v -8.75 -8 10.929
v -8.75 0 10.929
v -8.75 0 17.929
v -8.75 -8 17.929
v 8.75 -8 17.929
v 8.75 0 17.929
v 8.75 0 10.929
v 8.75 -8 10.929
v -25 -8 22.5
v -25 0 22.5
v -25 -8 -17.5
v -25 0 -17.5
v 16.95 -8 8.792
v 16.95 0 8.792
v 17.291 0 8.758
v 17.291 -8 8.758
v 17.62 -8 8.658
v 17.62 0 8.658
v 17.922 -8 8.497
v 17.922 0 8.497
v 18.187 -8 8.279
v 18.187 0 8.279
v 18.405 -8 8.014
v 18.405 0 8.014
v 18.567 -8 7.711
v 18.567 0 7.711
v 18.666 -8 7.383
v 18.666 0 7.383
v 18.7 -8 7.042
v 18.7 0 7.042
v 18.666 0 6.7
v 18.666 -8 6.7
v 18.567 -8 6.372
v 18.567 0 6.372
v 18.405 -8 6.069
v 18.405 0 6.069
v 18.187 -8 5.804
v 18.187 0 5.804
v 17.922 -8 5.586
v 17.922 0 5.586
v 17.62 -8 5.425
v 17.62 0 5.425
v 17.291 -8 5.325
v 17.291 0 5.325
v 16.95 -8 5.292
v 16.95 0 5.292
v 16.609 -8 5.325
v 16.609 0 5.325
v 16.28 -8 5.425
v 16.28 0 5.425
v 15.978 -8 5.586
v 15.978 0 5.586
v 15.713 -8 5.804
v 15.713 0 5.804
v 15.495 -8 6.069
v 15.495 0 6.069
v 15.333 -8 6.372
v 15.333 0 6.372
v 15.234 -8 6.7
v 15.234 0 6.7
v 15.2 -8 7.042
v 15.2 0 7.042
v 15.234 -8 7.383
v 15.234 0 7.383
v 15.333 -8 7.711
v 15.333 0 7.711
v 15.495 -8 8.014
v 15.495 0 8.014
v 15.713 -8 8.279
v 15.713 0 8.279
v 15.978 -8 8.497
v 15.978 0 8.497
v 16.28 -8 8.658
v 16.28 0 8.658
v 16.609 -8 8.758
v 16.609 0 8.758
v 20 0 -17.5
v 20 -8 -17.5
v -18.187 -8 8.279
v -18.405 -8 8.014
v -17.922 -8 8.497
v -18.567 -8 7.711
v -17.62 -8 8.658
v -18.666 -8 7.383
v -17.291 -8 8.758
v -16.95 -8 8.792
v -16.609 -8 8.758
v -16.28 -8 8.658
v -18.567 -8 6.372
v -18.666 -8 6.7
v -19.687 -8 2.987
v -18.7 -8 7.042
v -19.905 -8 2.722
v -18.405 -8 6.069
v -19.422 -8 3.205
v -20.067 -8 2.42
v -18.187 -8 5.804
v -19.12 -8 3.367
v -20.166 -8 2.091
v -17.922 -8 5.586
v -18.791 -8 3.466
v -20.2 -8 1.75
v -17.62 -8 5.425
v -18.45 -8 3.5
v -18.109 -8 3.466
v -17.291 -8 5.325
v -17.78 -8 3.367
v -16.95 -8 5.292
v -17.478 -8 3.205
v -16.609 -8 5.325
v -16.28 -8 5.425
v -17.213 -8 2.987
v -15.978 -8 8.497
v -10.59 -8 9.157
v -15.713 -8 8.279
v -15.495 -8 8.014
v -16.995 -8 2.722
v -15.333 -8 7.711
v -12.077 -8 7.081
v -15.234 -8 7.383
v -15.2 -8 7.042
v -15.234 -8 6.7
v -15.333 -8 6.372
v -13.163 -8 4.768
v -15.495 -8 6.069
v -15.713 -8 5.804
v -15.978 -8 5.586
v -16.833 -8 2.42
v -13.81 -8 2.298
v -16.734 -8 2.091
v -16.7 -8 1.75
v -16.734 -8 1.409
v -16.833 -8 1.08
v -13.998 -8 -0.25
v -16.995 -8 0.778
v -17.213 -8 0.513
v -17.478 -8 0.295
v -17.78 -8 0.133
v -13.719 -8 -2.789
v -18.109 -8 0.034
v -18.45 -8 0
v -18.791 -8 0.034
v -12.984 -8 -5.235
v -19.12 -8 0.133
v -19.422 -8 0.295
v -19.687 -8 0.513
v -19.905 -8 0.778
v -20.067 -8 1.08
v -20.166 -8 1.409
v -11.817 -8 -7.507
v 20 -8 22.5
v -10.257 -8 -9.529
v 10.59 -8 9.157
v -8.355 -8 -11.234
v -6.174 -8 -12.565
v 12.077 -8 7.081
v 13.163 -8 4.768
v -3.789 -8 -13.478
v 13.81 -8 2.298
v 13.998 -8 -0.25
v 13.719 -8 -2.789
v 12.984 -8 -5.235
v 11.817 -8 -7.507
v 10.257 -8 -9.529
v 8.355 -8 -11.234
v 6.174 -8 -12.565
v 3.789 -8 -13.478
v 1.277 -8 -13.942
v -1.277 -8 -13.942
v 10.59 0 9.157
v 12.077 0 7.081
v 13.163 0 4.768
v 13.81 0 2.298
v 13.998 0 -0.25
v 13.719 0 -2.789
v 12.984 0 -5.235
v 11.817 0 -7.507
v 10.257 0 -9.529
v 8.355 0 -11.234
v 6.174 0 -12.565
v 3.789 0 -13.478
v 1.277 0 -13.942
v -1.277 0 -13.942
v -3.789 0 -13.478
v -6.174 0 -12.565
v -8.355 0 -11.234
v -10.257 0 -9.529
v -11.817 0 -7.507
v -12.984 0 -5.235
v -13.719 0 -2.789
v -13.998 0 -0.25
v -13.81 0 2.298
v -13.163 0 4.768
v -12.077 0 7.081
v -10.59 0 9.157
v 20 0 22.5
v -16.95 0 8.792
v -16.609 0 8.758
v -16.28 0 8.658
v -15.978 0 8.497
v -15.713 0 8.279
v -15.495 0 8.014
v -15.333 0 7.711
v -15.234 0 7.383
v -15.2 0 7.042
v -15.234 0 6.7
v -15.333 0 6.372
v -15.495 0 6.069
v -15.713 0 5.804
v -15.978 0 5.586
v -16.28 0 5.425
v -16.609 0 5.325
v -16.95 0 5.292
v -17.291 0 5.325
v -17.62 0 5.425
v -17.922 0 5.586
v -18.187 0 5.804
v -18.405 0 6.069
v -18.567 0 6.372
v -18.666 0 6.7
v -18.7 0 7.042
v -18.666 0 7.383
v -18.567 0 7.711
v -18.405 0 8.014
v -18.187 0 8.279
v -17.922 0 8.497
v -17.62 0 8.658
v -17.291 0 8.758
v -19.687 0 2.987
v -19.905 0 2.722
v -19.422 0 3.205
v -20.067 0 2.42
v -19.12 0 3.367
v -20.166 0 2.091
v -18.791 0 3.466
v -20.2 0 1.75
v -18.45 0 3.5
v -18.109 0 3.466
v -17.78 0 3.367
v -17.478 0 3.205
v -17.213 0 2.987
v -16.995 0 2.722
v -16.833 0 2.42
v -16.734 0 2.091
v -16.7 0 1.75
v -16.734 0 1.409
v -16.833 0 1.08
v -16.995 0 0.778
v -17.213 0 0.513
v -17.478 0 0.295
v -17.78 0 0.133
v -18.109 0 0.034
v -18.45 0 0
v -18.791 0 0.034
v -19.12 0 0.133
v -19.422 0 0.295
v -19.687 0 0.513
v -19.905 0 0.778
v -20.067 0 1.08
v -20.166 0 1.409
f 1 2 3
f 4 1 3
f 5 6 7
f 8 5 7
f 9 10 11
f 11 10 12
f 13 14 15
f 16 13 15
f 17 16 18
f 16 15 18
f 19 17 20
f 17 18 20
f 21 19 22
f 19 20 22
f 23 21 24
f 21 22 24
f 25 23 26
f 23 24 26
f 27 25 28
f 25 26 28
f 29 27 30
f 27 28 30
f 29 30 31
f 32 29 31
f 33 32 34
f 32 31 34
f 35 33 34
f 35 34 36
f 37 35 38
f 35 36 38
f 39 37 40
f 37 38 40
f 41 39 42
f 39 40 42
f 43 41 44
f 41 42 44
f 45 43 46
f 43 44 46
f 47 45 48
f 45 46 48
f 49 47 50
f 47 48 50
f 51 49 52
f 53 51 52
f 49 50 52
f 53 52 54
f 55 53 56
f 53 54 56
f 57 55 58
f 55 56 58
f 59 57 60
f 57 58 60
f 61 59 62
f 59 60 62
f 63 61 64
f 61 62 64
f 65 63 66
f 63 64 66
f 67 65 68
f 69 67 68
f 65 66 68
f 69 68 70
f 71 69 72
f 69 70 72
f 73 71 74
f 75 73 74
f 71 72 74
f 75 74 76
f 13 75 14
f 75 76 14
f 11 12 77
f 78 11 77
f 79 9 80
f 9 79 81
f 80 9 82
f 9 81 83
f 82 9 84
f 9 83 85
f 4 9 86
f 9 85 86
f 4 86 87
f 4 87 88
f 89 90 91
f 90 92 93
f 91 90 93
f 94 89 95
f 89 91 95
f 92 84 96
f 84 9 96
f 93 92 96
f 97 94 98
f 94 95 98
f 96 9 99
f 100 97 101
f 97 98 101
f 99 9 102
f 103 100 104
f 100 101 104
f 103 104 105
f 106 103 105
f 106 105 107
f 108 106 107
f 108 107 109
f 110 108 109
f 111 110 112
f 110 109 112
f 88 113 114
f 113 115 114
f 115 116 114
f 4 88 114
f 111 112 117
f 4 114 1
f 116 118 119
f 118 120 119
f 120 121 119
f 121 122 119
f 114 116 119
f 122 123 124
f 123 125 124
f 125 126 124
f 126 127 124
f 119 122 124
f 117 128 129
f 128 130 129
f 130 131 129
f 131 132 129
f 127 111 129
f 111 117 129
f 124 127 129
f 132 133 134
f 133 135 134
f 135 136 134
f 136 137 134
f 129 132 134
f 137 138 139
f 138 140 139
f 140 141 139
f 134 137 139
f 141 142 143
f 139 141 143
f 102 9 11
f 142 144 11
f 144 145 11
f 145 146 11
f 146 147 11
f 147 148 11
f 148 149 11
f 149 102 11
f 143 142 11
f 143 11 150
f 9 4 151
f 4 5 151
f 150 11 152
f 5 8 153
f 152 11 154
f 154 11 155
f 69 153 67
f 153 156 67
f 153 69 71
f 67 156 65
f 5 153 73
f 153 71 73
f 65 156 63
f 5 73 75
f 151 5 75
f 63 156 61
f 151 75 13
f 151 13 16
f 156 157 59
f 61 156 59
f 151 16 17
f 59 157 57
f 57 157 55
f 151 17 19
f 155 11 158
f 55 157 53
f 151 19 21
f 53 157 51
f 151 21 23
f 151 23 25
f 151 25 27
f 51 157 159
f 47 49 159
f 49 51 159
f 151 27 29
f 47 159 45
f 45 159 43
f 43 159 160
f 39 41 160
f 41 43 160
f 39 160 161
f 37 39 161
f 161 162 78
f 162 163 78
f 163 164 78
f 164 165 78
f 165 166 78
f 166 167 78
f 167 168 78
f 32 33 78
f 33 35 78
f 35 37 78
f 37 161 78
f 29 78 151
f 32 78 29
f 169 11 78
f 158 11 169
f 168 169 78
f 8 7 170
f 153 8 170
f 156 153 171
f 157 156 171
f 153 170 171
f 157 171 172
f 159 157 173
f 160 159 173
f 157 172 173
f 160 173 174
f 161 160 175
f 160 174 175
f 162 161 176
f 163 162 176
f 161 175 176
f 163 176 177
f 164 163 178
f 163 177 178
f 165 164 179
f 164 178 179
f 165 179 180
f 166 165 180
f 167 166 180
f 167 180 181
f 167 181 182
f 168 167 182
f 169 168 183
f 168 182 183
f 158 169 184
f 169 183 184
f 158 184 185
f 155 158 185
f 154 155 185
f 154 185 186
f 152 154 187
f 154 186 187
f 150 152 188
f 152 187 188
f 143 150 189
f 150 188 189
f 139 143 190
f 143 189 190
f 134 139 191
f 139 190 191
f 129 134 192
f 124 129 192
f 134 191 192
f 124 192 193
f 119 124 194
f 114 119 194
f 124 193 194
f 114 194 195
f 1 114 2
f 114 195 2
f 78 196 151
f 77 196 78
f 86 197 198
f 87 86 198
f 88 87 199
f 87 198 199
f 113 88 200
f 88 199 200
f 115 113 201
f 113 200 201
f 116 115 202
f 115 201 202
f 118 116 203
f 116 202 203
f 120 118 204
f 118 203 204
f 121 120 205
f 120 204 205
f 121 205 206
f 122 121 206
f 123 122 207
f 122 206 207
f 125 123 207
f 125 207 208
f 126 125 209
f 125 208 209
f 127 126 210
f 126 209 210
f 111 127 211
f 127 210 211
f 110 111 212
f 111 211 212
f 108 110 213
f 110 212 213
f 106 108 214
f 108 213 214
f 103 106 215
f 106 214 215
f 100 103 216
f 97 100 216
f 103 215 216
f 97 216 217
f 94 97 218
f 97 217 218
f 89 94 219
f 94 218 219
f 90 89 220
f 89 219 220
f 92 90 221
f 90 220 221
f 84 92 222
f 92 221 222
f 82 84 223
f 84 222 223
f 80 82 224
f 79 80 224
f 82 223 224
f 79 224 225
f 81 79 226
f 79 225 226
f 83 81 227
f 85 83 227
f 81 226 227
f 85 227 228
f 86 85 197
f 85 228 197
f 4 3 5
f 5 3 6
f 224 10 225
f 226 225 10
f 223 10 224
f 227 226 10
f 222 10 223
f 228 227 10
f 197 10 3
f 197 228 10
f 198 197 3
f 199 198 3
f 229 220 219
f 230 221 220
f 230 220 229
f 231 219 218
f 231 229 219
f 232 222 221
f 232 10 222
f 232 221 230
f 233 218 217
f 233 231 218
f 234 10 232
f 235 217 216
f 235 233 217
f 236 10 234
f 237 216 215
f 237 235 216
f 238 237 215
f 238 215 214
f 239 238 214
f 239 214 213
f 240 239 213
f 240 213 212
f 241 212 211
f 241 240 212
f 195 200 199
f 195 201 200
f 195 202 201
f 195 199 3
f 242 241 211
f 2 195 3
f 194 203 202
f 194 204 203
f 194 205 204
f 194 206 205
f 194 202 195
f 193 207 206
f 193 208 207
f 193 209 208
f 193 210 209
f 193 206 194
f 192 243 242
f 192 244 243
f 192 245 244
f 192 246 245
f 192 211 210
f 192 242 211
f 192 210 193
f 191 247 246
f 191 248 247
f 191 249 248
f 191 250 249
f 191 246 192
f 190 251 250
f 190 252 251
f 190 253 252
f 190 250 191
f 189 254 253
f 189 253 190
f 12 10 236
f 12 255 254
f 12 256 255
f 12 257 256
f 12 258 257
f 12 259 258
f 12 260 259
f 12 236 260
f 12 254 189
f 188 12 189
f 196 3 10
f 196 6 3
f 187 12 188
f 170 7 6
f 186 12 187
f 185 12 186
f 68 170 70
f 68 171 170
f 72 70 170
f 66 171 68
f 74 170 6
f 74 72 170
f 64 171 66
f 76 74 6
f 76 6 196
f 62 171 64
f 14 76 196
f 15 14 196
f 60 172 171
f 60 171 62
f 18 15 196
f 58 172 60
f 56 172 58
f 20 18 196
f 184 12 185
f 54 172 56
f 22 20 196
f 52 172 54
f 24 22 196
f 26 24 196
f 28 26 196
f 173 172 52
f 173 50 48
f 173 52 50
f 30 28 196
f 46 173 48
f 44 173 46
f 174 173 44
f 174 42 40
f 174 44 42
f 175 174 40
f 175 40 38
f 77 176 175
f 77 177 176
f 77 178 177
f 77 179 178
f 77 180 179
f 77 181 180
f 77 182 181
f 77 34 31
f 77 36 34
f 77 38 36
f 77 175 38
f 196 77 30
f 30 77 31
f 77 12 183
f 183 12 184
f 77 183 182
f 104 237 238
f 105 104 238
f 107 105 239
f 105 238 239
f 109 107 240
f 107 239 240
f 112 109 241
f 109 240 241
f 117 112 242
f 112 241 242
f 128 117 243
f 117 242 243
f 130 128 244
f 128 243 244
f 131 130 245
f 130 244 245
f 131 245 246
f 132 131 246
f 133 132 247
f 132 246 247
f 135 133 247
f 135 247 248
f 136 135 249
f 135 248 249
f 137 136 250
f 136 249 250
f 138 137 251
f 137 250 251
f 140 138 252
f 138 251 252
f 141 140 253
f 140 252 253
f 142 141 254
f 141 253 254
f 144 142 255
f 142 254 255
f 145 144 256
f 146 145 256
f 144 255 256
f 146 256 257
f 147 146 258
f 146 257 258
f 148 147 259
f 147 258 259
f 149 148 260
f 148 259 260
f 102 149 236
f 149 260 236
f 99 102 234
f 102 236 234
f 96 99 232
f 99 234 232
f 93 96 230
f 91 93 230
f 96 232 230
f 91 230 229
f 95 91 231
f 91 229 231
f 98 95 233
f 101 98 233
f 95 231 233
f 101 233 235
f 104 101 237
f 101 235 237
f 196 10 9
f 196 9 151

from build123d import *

# Parameters (mm, degrees)
SKETCH2_W                          = 45
SKETCH2_H                          = 40
STEPPER_SLIDER_BOSS_EXTRUDE1_DEPTH = 8
SKETCH1_R                          = 1.75
STEPPER_HOLE_CUT_EXTRUDE1_DEPTH    = 8


with BuildPart() as part:
    # Sketch2 → Stepper Slider Boss-Extrude1 (new body)
    with BuildSketch(Plane(origin=(0, 0, 0), x_dir=(1, 0, 0), z_dir=(0, 1, 0))):
        with Locations((-2.5, -2.5)):
            Rectangle(SKETCH2_W, SKETCH2_H)
    extrude(amount=-STEPPER_SLIDER_BOSS_EXTRUDE1_DEPTH)

    # Sketch1 → Stepper Hole Cut-Extrude1 (cut)
    with BuildSketch(Plane(origin=(0, 0, 0), x_dir=(1, 0, 0), z_dir=(0, 1, 0))):
        with Locations(Location((-18.45, -1.75, 0), (0, 0, 270))):
            Circle(SKETCH1_R)
        with Locations(Location((16.95, -7.041502622, 0), (0, 0, 270))):
            Circle(SKETCH1_R)
        with Locations(Location((-16.95, -7.041502622, 0), (0, 0, 270))):
            Circle(SKETCH1_R)
        with BuildLine():
            Line((8.75, -17.928746497), (8.75, -10.928746497))
            ThreePointArc((8.75, -10.928746497), (0, 14), (-8.75, -10.928746497))
            Line((-8.75, -10.928746497), (-8.75, -17.928746497))
            Line((-8.75, -17.928746497), (8.75, -17.928746497))
        make_face()
    extrude(amount=-STEPPER_HOLE_CUT_EXTRUDE1_DEPTH, mode=Mode.SUBTRACT)


solid = part.part
